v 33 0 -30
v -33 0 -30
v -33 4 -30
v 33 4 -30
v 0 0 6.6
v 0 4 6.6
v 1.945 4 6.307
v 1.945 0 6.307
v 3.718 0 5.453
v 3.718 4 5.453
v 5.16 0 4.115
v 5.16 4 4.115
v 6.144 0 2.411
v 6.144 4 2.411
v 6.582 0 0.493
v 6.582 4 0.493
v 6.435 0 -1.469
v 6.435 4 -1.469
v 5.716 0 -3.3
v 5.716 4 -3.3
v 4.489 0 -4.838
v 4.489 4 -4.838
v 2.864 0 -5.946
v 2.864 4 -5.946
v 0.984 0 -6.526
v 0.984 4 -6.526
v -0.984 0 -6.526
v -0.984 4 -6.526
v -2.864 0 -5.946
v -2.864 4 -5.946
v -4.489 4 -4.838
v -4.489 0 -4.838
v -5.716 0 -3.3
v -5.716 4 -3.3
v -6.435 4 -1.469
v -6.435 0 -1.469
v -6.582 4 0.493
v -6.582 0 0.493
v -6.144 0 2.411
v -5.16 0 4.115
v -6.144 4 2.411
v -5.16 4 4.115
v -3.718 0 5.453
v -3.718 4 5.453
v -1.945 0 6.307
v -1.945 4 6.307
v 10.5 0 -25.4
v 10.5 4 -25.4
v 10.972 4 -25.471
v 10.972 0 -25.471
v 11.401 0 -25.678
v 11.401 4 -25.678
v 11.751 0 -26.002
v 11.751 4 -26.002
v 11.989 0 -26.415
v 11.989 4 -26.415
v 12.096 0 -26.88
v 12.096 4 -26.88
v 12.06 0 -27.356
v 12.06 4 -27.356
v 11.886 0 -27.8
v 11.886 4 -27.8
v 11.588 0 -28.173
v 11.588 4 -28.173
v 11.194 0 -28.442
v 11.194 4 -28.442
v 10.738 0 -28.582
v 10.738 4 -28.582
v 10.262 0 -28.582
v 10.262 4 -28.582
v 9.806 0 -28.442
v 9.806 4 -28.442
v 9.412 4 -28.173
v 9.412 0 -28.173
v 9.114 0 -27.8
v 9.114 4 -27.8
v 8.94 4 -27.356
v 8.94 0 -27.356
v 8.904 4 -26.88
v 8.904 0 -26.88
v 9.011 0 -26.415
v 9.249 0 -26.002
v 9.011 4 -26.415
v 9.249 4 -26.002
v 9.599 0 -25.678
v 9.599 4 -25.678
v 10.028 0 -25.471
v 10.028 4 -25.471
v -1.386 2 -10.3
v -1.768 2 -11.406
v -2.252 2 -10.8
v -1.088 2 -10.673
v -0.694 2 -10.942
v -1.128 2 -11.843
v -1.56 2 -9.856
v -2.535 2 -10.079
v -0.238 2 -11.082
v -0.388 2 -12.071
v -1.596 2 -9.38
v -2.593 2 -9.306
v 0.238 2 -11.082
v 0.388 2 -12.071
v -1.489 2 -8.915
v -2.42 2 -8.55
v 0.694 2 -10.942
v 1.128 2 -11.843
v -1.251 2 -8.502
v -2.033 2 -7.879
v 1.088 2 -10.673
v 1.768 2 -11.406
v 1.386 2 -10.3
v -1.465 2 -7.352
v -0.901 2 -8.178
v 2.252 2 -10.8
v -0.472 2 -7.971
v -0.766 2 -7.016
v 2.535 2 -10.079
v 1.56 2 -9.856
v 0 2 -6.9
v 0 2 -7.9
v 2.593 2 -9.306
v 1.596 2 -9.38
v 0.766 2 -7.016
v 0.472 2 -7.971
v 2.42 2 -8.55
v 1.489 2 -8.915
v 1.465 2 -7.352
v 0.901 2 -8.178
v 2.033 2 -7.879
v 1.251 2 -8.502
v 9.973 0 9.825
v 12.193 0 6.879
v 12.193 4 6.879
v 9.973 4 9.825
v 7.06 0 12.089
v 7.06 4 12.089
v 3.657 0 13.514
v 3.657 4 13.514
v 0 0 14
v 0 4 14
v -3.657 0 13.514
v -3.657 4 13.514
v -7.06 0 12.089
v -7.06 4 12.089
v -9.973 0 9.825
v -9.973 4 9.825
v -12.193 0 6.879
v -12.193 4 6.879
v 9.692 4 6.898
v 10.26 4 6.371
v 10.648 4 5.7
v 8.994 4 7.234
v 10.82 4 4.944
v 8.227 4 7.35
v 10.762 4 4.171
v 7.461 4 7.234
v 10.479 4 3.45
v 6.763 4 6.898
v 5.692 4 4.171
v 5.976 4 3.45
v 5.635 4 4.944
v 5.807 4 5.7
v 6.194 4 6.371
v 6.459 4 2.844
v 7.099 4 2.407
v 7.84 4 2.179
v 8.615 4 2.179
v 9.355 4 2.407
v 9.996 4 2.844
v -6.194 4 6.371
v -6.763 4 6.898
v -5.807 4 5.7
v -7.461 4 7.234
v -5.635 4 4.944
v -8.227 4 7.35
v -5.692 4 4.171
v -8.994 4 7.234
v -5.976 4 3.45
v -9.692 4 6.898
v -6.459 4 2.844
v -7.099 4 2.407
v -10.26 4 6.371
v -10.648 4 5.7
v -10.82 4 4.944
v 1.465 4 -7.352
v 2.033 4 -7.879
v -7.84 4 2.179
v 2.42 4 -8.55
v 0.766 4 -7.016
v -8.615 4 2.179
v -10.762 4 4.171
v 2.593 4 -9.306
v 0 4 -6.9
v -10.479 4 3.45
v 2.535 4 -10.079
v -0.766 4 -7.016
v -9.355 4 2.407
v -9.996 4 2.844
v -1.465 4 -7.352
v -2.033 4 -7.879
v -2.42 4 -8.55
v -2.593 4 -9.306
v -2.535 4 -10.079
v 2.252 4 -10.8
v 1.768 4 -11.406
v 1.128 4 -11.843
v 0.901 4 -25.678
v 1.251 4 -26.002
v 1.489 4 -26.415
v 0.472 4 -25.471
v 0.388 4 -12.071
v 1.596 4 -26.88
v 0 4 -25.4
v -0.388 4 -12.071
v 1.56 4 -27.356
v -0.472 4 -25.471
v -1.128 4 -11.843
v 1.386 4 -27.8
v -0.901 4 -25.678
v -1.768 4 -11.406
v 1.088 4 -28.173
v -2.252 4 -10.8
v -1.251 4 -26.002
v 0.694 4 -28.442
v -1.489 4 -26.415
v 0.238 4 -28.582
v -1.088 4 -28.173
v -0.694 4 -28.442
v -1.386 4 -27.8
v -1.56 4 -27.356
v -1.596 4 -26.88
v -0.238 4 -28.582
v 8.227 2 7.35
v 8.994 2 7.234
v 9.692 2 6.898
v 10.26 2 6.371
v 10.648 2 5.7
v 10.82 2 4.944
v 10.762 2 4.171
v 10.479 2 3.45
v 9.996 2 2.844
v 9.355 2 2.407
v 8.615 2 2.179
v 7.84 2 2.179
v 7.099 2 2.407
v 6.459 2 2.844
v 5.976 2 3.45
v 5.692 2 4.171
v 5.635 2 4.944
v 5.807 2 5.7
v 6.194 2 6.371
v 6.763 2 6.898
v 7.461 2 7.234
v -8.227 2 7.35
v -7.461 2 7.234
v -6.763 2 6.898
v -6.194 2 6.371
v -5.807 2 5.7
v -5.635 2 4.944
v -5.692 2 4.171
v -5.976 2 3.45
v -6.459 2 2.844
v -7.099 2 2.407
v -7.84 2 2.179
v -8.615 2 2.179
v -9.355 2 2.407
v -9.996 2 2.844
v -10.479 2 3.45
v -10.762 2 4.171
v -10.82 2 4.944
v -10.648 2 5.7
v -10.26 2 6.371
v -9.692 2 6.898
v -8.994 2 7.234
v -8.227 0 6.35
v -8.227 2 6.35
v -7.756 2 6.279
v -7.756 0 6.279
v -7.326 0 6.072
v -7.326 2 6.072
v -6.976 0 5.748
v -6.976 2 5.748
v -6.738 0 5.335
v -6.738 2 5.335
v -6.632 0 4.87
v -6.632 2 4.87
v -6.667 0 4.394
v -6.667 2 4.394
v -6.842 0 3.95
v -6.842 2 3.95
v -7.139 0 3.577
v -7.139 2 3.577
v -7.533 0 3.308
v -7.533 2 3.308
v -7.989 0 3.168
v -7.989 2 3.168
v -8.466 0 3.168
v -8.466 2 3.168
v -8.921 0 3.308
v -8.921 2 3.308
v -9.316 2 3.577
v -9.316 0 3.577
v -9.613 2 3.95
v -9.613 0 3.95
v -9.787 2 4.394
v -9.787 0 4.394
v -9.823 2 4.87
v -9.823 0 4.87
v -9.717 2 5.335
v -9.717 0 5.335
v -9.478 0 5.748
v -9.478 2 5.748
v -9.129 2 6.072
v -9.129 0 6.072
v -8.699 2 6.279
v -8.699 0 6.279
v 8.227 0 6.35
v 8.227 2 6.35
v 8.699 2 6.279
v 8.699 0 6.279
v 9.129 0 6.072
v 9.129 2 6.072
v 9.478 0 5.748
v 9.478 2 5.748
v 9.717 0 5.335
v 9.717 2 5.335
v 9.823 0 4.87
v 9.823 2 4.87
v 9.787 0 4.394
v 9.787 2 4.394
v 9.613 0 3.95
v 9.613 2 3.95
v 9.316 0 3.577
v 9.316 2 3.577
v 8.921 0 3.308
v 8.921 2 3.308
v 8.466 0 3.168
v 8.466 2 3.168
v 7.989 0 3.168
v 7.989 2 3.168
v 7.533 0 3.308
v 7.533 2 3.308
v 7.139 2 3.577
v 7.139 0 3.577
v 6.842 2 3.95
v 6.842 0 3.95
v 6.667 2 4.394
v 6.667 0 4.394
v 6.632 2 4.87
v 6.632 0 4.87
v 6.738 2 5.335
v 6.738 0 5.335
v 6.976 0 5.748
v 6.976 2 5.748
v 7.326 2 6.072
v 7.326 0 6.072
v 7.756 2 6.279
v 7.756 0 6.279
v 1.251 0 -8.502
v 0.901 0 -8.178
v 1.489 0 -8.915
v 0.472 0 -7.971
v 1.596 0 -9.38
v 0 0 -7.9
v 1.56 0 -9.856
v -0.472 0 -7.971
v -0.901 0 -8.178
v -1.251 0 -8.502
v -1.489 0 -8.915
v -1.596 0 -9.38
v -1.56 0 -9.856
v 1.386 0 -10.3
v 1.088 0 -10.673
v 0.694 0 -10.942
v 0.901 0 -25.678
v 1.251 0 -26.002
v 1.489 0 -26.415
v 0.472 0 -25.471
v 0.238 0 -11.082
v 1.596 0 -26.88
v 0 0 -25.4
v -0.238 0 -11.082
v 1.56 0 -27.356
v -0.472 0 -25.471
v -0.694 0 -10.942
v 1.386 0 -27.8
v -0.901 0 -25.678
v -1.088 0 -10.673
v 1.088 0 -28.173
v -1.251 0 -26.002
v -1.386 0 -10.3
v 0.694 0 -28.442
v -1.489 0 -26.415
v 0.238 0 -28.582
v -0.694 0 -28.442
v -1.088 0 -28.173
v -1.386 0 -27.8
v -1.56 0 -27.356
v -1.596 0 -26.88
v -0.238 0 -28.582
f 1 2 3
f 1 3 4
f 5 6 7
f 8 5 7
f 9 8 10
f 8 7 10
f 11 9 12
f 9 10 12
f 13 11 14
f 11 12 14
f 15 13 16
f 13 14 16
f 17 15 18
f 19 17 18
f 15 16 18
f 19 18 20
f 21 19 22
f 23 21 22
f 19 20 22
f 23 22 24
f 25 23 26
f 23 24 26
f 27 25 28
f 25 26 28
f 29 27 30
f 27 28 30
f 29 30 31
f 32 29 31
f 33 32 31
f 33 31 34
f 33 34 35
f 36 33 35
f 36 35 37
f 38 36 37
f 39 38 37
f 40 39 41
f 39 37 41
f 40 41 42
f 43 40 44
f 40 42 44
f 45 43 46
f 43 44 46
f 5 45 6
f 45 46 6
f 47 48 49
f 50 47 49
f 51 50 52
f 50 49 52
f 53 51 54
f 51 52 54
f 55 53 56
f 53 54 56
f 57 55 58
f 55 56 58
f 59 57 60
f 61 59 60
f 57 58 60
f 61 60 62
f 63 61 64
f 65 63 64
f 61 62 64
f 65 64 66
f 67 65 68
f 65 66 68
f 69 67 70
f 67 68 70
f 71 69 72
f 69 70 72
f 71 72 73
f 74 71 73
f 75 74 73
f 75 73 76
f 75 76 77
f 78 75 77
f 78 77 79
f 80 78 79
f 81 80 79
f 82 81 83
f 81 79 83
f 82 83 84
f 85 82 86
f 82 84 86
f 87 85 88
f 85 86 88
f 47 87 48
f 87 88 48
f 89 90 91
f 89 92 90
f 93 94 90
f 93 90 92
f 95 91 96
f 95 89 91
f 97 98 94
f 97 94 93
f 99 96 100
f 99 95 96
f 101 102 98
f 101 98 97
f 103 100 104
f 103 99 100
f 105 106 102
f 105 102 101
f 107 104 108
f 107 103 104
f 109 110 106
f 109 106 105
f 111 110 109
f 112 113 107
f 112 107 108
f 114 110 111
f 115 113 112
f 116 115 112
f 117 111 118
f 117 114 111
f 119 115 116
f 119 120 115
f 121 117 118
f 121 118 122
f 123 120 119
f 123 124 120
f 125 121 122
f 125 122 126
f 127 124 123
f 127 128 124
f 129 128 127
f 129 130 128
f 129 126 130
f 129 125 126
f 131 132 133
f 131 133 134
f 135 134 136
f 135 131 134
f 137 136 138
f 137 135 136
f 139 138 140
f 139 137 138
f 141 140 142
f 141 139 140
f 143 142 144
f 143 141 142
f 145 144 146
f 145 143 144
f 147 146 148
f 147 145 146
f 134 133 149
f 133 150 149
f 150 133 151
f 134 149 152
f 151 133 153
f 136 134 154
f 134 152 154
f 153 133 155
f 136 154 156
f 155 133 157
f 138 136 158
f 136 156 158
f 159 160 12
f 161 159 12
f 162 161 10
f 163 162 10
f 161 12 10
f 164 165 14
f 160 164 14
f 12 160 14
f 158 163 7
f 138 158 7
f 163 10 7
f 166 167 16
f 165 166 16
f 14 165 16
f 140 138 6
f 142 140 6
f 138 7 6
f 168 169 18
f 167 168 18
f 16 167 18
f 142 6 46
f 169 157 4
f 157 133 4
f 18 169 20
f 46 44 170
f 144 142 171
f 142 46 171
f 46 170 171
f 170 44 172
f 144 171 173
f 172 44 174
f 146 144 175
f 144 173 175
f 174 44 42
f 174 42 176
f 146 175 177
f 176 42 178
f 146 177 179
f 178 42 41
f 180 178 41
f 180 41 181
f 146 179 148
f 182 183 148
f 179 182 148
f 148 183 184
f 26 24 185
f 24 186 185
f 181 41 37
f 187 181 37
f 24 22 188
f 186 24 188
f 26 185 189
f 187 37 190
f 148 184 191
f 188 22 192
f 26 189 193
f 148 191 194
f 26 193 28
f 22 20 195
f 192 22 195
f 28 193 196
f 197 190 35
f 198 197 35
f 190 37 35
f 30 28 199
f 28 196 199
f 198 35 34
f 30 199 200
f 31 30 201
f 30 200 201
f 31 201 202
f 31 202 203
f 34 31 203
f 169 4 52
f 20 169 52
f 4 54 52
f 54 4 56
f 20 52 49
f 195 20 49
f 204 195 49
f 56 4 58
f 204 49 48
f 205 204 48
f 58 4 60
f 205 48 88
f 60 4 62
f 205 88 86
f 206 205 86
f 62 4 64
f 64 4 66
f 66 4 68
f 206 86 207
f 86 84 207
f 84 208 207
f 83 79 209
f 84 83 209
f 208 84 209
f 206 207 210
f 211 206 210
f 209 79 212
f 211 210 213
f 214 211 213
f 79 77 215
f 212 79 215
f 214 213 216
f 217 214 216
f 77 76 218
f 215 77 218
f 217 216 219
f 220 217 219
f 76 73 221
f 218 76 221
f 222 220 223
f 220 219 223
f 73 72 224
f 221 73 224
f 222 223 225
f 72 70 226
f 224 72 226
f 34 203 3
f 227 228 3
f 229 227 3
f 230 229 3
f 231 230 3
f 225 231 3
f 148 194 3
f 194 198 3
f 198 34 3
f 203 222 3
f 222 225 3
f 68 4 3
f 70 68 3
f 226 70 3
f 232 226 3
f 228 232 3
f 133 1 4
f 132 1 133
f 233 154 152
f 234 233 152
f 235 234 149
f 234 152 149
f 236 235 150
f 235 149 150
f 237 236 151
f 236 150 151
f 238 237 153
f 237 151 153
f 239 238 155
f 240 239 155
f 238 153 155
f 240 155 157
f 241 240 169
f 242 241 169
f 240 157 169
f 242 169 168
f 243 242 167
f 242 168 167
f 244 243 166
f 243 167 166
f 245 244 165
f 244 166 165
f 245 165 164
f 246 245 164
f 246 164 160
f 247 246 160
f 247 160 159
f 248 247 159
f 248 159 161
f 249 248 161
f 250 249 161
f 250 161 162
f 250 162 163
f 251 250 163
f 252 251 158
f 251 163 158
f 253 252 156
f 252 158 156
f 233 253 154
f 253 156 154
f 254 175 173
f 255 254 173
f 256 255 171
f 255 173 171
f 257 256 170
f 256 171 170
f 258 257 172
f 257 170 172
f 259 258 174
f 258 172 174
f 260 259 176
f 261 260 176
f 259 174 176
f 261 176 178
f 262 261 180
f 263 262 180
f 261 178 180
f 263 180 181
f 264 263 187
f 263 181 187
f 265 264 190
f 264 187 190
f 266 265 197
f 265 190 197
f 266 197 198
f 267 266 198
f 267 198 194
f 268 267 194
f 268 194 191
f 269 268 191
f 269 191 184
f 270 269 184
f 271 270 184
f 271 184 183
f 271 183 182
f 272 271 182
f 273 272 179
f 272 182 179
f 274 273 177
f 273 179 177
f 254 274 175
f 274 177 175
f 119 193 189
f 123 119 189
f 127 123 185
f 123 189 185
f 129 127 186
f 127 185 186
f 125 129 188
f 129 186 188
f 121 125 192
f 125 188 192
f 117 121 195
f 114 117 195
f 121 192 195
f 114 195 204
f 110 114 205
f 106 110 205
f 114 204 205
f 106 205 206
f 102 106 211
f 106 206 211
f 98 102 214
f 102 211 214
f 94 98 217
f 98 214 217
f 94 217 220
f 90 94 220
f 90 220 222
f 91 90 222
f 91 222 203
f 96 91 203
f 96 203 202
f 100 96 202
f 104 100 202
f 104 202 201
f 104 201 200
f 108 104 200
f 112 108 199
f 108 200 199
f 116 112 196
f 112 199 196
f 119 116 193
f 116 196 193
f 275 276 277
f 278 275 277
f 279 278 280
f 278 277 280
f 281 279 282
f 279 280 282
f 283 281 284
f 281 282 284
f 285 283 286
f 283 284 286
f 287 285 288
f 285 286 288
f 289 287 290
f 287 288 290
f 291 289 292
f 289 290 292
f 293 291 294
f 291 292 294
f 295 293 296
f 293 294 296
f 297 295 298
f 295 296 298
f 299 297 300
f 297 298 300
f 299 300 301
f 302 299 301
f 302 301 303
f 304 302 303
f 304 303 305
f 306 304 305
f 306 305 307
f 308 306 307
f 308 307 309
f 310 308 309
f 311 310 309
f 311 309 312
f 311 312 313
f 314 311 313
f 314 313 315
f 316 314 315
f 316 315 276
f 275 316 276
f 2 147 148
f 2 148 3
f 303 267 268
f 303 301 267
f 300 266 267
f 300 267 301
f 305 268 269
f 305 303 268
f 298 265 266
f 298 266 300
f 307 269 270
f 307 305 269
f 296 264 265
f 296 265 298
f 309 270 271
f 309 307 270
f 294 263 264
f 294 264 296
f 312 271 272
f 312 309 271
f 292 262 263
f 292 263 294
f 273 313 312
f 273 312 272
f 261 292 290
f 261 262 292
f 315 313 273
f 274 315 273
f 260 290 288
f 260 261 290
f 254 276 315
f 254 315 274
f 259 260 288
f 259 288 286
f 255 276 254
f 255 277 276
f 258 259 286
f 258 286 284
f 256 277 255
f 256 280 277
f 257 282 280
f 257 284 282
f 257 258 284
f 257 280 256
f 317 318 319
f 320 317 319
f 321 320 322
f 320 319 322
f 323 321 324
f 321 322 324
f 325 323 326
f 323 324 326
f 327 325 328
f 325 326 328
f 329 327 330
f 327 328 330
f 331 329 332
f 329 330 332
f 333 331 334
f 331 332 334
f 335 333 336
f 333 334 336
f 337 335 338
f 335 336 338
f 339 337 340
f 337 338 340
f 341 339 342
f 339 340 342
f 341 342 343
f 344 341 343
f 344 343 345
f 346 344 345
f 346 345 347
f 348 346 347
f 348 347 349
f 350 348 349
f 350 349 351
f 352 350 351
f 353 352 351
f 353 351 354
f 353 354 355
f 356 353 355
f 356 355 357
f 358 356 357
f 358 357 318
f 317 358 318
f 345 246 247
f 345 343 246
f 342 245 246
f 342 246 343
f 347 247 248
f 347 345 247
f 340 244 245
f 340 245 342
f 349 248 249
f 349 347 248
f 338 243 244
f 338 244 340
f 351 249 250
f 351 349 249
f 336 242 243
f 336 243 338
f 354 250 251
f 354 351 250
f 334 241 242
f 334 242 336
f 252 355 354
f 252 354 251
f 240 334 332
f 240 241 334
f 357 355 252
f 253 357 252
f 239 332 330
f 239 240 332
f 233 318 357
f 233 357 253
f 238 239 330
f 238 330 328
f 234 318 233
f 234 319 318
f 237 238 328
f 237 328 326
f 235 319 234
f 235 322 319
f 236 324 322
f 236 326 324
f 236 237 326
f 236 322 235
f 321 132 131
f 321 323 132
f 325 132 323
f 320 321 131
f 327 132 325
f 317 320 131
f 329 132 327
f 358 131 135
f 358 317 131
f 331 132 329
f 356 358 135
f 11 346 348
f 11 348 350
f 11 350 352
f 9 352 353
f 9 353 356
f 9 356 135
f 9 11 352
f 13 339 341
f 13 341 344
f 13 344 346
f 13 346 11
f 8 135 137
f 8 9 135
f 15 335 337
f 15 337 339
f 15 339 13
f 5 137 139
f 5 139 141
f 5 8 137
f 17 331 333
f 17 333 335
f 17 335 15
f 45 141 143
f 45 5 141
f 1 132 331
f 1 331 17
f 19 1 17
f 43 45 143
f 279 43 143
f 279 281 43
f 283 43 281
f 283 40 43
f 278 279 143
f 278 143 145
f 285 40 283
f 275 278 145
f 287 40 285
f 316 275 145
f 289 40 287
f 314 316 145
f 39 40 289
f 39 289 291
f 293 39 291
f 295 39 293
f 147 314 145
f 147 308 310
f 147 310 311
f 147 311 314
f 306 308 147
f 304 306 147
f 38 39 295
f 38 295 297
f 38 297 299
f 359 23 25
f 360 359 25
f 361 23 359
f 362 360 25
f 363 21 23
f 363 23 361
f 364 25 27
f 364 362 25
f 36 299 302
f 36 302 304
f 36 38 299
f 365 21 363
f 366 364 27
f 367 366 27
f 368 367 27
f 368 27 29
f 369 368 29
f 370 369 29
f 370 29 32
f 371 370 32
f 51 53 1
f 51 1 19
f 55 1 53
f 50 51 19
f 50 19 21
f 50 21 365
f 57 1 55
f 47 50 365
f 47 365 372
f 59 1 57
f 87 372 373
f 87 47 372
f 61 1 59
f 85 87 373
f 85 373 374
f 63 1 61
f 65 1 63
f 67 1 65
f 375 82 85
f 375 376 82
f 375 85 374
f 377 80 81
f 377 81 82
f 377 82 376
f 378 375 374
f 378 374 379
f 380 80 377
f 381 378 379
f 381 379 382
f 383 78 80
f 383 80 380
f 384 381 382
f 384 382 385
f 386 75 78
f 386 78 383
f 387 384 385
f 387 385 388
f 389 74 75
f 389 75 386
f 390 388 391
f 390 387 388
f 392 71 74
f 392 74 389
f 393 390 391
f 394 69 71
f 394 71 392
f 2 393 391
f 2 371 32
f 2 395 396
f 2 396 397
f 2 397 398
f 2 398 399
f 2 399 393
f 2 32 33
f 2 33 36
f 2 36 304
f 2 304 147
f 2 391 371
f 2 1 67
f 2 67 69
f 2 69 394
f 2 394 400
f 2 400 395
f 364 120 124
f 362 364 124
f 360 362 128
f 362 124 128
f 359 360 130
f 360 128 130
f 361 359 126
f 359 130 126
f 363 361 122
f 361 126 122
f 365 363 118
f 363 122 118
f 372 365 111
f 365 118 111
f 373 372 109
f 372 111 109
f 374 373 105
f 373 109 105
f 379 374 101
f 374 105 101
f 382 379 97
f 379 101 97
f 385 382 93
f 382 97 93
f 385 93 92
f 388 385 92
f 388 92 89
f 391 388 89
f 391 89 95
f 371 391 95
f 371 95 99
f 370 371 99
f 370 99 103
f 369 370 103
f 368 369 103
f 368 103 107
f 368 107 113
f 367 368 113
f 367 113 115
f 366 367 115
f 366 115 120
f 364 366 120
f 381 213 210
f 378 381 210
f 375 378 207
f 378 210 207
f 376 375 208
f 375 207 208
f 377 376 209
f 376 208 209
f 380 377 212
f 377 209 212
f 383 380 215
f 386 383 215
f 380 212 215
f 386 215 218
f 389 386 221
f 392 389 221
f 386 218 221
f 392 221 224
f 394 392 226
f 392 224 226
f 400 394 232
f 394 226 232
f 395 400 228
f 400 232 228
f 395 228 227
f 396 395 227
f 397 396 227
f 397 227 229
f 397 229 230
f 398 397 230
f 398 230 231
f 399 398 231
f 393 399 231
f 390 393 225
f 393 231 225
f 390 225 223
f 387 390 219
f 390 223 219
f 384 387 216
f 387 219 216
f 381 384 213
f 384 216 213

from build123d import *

# Parameters (mm, degrees)
EXTRUDE_1_DEPTH     = 4
SKETCH_3_R          = 1.6
SKETCH_3_R_2        = 6.6
CUT_EXTRUDE_3_DEPTH = 4
SKETCH_4_R          = 1.6
CUT_EXTRUDE_4_DEPTH = 4
SKETCH_5_R          = 2.6
CUT_EXTRUDE_6_DEPTH = 2


with BuildPart() as part:
    # 草图1 → 凸台-拉伸1 (new body)
    with BuildSketch(Plane(origin=(0, 0, 0), x_dir=(1, 0, 0), z_dir=(0, 1, 0))):
        with BuildLine():
            Line((33, 30), (12.193267422, -6.879260831))
            ThreePointArc((12.193267422, -6.879260831), (0, -14), (-12.193267422, -6.879260831))
            Line((-12.193267422, -6.879260831), (-33, 30))
            Line((-33, 30), (33, 30))
        make_face()
    extrude(amount=EXTRUDE_1_DEPTH)

    # 草图3 → 切除-拉伸3 (cut)
    with BuildSketch(Plane(origin=(0, 4, 0), x_dir=(1, 0, 0), z_dir=(0, 1, 0))):
        with Locations(Location((-8.227241336, -4.75, 0), (0, 0, 270))):
            Circle(SKETCH_3_R)
        with Locations(Location((8.227241336, -4.75, 0), (0, 0, 270))):
            Circle(SKETCH_3_R)
        with Locations(Location((0, 0, 0), (0, 0, 270))):
            Circle(SKETCH_3_R_2)
        with Locations(Location((0, 9.5, 0), (0, 0, 270))):
            Circle(SKETCH_3_R)
    extrude(amount=-CUT_EXTRUDE_3_DEPTH, mode=Mode.SUBTRACT)

    # 草图4 → 切除-拉伸4 (cut)
    with BuildSketch(Plane(origin=(0, 4, 0), x_dir=(1, 0, 0), z_dir=(0, 1, 0))):
        with Locations(Location((0, 27, 0), (0, 0, 270))):
            Circle(SKETCH_4_R)
        with Locations(Location((10.5, 27, 0), (0, 0, 270))):
            Circle(SKETCH_4_R)
    extrude(amount=-CUT_EXTRUDE_4_DEPTH, mode=Mode.SUBTRACT)

    # 草图5 → 切除-拉伸6 (cut)
    with BuildSketch(Plane(origin=(0, 4, 0), x_dir=(1, 0, 0), z_dir=(0, 1, 0))):
        with Locations(Location((0, 9.5, 0), (0, 0, 270))):
            Circle(SKETCH_5_R)
        with Locations(Location((8.227241336, -4.75, 0), (0, 0, 270))):
            Circle(SKETCH_5_R)
        with Locations(Location((-8.227241336, -4.75, 0), (0, 0, 270))):
            Circle(SKETCH_5_R)
    extrude(amount=-CUT_EXTRUDE_6_DEPTH, mode=Mode.SUBTRACT)


solid = part.part
